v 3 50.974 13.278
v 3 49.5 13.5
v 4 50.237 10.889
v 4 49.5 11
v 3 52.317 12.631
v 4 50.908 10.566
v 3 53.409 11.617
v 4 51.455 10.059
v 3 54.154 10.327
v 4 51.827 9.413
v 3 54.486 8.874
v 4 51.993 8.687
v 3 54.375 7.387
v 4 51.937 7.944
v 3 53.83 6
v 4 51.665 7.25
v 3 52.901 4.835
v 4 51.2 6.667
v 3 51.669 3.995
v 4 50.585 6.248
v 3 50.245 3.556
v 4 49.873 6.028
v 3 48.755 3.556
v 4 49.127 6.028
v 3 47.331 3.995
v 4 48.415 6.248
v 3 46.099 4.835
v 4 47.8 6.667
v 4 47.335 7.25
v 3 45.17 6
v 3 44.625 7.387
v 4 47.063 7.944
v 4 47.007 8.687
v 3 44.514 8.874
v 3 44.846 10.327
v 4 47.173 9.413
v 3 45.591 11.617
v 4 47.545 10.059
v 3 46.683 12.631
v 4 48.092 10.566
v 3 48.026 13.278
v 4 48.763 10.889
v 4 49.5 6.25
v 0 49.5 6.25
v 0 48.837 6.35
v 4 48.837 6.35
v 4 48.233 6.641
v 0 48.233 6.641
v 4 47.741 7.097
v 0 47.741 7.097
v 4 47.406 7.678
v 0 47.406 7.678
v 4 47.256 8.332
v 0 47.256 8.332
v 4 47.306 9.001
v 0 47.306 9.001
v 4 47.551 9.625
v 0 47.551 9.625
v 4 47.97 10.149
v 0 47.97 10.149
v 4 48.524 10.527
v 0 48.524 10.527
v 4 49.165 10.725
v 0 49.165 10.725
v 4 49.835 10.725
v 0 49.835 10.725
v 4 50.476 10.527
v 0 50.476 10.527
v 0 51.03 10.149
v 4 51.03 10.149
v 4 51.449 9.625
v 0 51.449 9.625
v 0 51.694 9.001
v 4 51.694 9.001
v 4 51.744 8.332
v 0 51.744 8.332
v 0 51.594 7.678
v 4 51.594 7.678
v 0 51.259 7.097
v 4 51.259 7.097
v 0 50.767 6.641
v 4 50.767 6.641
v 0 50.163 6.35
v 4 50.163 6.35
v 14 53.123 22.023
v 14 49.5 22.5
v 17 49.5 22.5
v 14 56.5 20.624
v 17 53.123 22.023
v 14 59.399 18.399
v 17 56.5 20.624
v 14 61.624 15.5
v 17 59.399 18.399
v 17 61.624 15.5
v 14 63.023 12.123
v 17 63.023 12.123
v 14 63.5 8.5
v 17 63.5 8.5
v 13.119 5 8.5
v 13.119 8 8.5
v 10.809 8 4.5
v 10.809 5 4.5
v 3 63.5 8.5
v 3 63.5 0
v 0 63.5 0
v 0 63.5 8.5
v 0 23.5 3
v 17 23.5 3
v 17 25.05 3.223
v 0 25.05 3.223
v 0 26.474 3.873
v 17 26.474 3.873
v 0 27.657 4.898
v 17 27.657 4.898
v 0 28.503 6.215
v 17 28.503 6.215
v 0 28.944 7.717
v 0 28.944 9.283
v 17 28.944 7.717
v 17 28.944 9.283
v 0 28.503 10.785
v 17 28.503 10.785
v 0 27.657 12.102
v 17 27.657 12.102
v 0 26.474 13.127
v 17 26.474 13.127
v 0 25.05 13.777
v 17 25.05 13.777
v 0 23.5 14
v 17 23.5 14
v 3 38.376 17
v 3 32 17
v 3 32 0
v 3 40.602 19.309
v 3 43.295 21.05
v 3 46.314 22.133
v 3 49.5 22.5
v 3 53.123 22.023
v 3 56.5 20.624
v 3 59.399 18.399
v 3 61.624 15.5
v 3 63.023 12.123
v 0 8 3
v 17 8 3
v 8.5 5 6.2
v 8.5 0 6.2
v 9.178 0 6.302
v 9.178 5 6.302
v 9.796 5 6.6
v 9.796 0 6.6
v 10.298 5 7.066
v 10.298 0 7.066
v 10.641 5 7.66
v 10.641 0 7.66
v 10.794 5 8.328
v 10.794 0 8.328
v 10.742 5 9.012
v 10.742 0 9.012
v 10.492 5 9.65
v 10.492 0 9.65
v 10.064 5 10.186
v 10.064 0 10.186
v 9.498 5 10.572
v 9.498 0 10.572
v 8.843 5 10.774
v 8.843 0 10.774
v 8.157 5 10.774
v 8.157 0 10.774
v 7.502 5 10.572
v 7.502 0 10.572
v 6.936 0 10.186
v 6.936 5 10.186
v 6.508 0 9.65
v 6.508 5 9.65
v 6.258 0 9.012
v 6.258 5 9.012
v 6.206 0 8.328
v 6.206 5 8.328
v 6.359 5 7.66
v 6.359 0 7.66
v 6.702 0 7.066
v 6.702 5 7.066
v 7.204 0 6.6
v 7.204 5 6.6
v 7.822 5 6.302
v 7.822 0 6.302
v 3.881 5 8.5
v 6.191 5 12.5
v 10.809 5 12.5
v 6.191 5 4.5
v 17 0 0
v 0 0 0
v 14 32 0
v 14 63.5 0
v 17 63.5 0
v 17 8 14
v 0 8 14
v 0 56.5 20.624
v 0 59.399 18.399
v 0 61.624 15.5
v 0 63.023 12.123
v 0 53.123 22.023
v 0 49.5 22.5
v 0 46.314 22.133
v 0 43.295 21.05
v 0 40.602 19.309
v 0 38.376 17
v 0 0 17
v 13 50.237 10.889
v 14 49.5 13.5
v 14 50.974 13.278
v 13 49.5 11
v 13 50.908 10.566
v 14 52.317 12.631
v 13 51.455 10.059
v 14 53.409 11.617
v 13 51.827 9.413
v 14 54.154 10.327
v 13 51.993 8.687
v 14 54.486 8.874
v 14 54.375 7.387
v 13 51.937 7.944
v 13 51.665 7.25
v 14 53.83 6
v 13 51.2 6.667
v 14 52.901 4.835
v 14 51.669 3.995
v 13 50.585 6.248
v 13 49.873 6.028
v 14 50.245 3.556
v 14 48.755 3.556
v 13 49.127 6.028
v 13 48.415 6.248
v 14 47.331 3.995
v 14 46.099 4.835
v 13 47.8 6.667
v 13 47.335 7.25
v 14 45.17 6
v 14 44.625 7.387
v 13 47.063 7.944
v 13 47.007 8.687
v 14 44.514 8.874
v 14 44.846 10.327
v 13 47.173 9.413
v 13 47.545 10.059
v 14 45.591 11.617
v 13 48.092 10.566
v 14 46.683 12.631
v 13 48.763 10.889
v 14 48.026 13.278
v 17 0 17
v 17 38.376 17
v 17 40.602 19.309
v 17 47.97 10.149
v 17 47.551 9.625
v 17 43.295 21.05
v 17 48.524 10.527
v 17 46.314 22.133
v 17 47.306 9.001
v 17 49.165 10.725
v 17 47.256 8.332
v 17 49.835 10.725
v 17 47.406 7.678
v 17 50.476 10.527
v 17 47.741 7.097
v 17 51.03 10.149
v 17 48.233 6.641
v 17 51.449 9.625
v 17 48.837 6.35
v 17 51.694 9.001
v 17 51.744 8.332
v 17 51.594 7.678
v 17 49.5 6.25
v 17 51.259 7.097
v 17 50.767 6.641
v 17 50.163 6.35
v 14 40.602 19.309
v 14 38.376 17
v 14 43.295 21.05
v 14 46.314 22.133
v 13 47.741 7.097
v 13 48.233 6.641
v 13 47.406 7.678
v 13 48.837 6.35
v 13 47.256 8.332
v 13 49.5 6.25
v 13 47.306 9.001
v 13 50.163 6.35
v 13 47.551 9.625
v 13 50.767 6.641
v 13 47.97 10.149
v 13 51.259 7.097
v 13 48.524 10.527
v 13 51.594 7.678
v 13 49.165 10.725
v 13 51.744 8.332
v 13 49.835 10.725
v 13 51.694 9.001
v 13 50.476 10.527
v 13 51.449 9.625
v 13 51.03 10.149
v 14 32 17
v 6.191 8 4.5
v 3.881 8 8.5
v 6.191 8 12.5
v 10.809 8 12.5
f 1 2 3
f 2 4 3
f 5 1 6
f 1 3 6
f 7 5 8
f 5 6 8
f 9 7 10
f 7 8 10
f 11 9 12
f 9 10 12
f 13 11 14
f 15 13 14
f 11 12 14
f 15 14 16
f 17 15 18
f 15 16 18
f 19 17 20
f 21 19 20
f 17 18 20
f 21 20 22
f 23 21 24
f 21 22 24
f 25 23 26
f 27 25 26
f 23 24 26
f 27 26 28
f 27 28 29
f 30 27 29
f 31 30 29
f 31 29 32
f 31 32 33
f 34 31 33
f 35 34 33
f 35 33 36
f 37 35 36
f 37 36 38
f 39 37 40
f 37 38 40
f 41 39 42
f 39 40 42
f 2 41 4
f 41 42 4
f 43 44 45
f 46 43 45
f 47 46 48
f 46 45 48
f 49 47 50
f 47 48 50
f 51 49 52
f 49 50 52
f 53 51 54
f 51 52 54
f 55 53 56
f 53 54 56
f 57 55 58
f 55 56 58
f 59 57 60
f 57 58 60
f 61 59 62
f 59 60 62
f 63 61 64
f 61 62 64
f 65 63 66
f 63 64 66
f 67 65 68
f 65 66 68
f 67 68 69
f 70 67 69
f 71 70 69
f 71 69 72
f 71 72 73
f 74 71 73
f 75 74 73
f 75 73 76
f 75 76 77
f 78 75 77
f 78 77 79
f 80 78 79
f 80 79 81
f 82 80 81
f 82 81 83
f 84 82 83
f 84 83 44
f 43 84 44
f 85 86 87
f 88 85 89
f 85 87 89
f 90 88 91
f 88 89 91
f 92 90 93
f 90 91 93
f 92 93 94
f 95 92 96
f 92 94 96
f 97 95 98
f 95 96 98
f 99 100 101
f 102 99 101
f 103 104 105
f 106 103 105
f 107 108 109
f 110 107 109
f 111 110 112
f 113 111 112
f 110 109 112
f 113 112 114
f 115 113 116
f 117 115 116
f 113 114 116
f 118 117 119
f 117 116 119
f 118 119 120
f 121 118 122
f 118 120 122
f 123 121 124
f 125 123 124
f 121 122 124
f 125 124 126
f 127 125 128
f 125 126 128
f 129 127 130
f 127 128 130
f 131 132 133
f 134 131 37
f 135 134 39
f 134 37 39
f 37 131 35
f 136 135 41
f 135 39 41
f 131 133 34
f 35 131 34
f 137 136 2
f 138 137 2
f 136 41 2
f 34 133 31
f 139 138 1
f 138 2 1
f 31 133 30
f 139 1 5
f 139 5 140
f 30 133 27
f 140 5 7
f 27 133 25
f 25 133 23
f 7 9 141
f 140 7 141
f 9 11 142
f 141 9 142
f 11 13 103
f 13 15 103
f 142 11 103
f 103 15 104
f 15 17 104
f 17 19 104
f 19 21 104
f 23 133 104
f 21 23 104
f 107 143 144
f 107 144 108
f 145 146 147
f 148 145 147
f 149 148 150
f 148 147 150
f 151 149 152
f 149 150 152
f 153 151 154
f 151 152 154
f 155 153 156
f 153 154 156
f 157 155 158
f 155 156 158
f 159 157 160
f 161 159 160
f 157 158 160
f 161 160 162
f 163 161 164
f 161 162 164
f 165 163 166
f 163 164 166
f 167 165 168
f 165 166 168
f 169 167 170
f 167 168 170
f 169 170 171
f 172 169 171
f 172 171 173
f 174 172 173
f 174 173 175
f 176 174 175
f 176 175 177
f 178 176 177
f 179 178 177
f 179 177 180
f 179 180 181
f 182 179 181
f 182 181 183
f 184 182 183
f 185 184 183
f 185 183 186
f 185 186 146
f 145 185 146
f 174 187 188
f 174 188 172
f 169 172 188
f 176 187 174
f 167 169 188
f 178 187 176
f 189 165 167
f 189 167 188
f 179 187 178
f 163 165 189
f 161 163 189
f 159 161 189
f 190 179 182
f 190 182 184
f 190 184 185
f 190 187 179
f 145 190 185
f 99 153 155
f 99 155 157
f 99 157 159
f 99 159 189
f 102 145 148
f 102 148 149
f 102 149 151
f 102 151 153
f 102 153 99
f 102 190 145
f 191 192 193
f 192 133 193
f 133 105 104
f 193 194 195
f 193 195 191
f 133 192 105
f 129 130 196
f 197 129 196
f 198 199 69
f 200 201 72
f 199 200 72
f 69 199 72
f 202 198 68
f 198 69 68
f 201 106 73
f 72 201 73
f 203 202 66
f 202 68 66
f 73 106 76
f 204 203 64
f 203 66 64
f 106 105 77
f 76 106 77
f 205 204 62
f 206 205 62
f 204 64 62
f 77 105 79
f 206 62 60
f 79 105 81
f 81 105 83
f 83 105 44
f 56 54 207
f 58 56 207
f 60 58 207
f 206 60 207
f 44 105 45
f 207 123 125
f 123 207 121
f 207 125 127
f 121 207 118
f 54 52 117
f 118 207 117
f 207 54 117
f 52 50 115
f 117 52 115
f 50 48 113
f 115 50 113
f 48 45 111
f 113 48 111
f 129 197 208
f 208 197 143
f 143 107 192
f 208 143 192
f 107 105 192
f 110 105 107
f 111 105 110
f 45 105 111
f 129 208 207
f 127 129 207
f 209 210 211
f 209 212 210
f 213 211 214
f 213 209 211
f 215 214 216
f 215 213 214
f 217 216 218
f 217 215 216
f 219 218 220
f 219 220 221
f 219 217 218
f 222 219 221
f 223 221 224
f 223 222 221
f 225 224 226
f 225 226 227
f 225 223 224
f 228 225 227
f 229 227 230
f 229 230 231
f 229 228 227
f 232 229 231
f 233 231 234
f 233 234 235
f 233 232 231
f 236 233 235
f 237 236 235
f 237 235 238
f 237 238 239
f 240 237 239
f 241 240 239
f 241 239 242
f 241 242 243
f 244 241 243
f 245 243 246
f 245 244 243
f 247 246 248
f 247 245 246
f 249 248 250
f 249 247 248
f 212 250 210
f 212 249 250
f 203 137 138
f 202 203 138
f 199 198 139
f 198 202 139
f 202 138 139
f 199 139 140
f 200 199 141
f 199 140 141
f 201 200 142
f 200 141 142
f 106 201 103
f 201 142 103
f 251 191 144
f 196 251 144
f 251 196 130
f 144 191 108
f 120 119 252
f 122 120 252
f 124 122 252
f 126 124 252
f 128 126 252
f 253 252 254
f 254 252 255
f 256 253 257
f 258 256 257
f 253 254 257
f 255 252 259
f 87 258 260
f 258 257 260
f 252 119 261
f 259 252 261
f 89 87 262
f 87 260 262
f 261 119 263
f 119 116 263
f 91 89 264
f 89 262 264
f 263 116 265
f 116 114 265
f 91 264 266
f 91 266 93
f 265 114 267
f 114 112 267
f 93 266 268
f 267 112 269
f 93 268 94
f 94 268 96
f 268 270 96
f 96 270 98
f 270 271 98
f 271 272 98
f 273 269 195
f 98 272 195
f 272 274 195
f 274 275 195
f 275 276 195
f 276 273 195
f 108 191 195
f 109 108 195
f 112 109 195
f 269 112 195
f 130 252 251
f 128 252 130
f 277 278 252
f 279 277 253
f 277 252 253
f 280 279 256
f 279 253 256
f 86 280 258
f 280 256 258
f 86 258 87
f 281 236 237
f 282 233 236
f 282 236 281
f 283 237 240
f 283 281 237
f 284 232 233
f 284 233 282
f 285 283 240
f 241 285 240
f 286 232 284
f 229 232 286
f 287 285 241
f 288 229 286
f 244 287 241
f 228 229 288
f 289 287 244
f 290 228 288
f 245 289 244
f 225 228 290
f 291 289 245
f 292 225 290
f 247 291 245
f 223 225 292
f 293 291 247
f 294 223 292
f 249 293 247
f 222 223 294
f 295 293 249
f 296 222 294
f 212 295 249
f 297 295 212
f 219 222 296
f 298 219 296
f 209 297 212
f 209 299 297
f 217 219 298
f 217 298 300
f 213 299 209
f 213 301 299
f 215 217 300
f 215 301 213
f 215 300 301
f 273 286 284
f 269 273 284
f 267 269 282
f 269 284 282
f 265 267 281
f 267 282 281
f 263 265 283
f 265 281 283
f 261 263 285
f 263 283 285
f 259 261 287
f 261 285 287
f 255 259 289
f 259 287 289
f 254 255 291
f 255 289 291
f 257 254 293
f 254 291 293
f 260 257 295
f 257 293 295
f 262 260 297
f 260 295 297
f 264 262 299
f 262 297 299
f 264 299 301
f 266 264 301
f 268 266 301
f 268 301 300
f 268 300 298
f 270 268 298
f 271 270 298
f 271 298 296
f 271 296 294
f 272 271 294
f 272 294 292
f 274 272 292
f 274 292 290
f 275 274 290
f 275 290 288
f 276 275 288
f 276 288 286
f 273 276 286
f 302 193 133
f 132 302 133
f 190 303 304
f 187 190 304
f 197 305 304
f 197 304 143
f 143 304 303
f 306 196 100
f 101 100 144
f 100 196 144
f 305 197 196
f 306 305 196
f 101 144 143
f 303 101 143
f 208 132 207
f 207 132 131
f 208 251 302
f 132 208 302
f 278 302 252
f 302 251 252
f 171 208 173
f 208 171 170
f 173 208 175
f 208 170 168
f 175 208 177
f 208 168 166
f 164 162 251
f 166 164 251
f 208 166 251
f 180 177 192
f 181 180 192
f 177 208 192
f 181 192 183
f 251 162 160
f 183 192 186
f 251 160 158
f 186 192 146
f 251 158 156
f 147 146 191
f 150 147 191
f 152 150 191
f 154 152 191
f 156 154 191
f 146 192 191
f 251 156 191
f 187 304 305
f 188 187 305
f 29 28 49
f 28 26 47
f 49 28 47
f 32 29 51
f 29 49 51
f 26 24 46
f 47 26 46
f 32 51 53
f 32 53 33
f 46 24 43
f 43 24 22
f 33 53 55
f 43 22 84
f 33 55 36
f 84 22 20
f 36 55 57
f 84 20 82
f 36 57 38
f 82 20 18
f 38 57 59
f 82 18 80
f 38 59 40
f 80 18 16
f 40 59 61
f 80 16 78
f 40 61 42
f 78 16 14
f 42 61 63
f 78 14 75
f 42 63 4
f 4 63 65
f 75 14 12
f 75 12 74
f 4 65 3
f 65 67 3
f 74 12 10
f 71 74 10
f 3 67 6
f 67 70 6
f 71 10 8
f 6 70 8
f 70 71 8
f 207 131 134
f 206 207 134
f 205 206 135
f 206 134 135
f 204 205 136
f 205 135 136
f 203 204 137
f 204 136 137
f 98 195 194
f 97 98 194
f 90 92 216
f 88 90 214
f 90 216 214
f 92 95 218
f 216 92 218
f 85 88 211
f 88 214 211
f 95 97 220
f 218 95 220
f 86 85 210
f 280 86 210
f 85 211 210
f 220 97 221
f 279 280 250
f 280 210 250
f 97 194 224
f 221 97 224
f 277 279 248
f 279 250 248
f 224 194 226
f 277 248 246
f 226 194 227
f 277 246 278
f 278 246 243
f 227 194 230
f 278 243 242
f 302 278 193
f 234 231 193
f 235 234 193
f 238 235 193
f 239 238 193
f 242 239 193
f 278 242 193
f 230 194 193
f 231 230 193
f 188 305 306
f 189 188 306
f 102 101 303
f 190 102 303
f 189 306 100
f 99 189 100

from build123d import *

# Parameters (mm, degrees)
BOSS_EXTRUDE1_DEPTH  = 22.5
CUT_EXTRUDE1_DEPTH   = 70.480213011
SKETCH3_R            = 2.3
CUT_EXTRUDE2_DEPTH   = 8
CUT_EXTRUDE3_DEPTH   = 3
SKETCH5_R            = 5
SKETCH6_R            = 2.5
M4_CLEARANCE_HOLE1_D = 4.5


with BuildPart() as part:
    # Sketch1 → Boss-Extrude1 (new body)
    with BuildSketch(Plane.XY):
        Polygon((0, 0), (17, 0), (17, 63.5), (14, 63.5), (14, 32), (3, 32), (3, 63.5), (0, 63.5), align=None)
    extrude(amount=BOSS_EXTRUDE1_DEPTH)

    # Sketch2 → Cut-Extrude1 (cut, through all)
    with BuildSketch(Plane(origin=(17, 0, 0), x_dir=(0, 0, -1), z_dir=(1, 0, 0))):
        with BuildLine():
            ThreePointArc((-3, 23.5), (-8.5, 29), (-14, 23.5))
            Line((-14, 23.5), (-14, 8))
            Line((-14, 8), (-3, 8))
            Line((-3, 8), (-3, 23.5))
        make_face()
        with BuildLine():
            ThreePointArc((-17, 38.375702269), (-21.049900398, 43.295163177), (-22.5, 49.5))
            Line((-22.5, 49.5), (-22.5, 0))
            Line((-22.5, 0), (-17, 0))
            Line((-17, 0), (-17, 38.375702269))
        make_face()
        with BuildLine():
            Line((-8.5, 63.5), (-22.5, 63.5))
            Line((-22.5, 63.5), (-22.5, 49.5))
            ThreePointArc((-22.5, 49.5), (-18.399494937, 59.399494937), (-8.5, 63.5))
        make_face()
    extrude(amount=-CUT_EXTRUDE1_DEPTH, mode=Mode.SUBTRACT)

    # Sketch3 → Cut-Extrude2 (cut)
    with BuildSketch(Plane.XZ):
        with Locations(Location((8.5, 8.5, 0), (0, 0, 270))):
            Circle(SKETCH3_R)
    extrude(amount=-CUT_EXTRUDE2_DEPTH, mode=Mode.SUBTRACT)

    # Sketch4 → Cut-Extrude3 (cut)
    with BuildSketch(Plane(origin=(0, 8, 0), x_dir=(1, 0, 0), z_dir=(0, 1, 0))):
        Polygon((3.881197846, -8.5), (6.190598923, -12.5), (10.809401077, -12.5), (13.118802154, -8.5), (10.809401077, -4.5), (6.190598923, -4.5), align=None)
    extrude(amount=-CUT_EXTRUDE3_DEPTH, mode=Mode.SUBTRACT)

    # Sketch5 → Loft1 section 0
    with BuildSketch(Plane.ZY.offset(-14)):
        with Locations((8.5, 49.5)):
            Circle(SKETCH5_R)
    # Sketch6 → Loft1 section 1
    with BuildSketch(Plane.ZY.offset(-13)):
        with Locations((8.5, 49.5)):
            Circle(SKETCH6_R)
    loft1 = loft()

    # Mirror1: Loft1 across plane
    add(loft1.mirror(Plane.ZY.offset(-8.5)))

    # M4 Clearance Hole1 (through all)
    with Locations(Plane(origin=(17, 49.5, 8.5), x_dir=(0, 0, 1), z_dir=(1, 0, 0))):
        with Locations((0, 0)):
            Hole(M4_CLEARANCE_HOLE1_D / 2)


solid = part.part
